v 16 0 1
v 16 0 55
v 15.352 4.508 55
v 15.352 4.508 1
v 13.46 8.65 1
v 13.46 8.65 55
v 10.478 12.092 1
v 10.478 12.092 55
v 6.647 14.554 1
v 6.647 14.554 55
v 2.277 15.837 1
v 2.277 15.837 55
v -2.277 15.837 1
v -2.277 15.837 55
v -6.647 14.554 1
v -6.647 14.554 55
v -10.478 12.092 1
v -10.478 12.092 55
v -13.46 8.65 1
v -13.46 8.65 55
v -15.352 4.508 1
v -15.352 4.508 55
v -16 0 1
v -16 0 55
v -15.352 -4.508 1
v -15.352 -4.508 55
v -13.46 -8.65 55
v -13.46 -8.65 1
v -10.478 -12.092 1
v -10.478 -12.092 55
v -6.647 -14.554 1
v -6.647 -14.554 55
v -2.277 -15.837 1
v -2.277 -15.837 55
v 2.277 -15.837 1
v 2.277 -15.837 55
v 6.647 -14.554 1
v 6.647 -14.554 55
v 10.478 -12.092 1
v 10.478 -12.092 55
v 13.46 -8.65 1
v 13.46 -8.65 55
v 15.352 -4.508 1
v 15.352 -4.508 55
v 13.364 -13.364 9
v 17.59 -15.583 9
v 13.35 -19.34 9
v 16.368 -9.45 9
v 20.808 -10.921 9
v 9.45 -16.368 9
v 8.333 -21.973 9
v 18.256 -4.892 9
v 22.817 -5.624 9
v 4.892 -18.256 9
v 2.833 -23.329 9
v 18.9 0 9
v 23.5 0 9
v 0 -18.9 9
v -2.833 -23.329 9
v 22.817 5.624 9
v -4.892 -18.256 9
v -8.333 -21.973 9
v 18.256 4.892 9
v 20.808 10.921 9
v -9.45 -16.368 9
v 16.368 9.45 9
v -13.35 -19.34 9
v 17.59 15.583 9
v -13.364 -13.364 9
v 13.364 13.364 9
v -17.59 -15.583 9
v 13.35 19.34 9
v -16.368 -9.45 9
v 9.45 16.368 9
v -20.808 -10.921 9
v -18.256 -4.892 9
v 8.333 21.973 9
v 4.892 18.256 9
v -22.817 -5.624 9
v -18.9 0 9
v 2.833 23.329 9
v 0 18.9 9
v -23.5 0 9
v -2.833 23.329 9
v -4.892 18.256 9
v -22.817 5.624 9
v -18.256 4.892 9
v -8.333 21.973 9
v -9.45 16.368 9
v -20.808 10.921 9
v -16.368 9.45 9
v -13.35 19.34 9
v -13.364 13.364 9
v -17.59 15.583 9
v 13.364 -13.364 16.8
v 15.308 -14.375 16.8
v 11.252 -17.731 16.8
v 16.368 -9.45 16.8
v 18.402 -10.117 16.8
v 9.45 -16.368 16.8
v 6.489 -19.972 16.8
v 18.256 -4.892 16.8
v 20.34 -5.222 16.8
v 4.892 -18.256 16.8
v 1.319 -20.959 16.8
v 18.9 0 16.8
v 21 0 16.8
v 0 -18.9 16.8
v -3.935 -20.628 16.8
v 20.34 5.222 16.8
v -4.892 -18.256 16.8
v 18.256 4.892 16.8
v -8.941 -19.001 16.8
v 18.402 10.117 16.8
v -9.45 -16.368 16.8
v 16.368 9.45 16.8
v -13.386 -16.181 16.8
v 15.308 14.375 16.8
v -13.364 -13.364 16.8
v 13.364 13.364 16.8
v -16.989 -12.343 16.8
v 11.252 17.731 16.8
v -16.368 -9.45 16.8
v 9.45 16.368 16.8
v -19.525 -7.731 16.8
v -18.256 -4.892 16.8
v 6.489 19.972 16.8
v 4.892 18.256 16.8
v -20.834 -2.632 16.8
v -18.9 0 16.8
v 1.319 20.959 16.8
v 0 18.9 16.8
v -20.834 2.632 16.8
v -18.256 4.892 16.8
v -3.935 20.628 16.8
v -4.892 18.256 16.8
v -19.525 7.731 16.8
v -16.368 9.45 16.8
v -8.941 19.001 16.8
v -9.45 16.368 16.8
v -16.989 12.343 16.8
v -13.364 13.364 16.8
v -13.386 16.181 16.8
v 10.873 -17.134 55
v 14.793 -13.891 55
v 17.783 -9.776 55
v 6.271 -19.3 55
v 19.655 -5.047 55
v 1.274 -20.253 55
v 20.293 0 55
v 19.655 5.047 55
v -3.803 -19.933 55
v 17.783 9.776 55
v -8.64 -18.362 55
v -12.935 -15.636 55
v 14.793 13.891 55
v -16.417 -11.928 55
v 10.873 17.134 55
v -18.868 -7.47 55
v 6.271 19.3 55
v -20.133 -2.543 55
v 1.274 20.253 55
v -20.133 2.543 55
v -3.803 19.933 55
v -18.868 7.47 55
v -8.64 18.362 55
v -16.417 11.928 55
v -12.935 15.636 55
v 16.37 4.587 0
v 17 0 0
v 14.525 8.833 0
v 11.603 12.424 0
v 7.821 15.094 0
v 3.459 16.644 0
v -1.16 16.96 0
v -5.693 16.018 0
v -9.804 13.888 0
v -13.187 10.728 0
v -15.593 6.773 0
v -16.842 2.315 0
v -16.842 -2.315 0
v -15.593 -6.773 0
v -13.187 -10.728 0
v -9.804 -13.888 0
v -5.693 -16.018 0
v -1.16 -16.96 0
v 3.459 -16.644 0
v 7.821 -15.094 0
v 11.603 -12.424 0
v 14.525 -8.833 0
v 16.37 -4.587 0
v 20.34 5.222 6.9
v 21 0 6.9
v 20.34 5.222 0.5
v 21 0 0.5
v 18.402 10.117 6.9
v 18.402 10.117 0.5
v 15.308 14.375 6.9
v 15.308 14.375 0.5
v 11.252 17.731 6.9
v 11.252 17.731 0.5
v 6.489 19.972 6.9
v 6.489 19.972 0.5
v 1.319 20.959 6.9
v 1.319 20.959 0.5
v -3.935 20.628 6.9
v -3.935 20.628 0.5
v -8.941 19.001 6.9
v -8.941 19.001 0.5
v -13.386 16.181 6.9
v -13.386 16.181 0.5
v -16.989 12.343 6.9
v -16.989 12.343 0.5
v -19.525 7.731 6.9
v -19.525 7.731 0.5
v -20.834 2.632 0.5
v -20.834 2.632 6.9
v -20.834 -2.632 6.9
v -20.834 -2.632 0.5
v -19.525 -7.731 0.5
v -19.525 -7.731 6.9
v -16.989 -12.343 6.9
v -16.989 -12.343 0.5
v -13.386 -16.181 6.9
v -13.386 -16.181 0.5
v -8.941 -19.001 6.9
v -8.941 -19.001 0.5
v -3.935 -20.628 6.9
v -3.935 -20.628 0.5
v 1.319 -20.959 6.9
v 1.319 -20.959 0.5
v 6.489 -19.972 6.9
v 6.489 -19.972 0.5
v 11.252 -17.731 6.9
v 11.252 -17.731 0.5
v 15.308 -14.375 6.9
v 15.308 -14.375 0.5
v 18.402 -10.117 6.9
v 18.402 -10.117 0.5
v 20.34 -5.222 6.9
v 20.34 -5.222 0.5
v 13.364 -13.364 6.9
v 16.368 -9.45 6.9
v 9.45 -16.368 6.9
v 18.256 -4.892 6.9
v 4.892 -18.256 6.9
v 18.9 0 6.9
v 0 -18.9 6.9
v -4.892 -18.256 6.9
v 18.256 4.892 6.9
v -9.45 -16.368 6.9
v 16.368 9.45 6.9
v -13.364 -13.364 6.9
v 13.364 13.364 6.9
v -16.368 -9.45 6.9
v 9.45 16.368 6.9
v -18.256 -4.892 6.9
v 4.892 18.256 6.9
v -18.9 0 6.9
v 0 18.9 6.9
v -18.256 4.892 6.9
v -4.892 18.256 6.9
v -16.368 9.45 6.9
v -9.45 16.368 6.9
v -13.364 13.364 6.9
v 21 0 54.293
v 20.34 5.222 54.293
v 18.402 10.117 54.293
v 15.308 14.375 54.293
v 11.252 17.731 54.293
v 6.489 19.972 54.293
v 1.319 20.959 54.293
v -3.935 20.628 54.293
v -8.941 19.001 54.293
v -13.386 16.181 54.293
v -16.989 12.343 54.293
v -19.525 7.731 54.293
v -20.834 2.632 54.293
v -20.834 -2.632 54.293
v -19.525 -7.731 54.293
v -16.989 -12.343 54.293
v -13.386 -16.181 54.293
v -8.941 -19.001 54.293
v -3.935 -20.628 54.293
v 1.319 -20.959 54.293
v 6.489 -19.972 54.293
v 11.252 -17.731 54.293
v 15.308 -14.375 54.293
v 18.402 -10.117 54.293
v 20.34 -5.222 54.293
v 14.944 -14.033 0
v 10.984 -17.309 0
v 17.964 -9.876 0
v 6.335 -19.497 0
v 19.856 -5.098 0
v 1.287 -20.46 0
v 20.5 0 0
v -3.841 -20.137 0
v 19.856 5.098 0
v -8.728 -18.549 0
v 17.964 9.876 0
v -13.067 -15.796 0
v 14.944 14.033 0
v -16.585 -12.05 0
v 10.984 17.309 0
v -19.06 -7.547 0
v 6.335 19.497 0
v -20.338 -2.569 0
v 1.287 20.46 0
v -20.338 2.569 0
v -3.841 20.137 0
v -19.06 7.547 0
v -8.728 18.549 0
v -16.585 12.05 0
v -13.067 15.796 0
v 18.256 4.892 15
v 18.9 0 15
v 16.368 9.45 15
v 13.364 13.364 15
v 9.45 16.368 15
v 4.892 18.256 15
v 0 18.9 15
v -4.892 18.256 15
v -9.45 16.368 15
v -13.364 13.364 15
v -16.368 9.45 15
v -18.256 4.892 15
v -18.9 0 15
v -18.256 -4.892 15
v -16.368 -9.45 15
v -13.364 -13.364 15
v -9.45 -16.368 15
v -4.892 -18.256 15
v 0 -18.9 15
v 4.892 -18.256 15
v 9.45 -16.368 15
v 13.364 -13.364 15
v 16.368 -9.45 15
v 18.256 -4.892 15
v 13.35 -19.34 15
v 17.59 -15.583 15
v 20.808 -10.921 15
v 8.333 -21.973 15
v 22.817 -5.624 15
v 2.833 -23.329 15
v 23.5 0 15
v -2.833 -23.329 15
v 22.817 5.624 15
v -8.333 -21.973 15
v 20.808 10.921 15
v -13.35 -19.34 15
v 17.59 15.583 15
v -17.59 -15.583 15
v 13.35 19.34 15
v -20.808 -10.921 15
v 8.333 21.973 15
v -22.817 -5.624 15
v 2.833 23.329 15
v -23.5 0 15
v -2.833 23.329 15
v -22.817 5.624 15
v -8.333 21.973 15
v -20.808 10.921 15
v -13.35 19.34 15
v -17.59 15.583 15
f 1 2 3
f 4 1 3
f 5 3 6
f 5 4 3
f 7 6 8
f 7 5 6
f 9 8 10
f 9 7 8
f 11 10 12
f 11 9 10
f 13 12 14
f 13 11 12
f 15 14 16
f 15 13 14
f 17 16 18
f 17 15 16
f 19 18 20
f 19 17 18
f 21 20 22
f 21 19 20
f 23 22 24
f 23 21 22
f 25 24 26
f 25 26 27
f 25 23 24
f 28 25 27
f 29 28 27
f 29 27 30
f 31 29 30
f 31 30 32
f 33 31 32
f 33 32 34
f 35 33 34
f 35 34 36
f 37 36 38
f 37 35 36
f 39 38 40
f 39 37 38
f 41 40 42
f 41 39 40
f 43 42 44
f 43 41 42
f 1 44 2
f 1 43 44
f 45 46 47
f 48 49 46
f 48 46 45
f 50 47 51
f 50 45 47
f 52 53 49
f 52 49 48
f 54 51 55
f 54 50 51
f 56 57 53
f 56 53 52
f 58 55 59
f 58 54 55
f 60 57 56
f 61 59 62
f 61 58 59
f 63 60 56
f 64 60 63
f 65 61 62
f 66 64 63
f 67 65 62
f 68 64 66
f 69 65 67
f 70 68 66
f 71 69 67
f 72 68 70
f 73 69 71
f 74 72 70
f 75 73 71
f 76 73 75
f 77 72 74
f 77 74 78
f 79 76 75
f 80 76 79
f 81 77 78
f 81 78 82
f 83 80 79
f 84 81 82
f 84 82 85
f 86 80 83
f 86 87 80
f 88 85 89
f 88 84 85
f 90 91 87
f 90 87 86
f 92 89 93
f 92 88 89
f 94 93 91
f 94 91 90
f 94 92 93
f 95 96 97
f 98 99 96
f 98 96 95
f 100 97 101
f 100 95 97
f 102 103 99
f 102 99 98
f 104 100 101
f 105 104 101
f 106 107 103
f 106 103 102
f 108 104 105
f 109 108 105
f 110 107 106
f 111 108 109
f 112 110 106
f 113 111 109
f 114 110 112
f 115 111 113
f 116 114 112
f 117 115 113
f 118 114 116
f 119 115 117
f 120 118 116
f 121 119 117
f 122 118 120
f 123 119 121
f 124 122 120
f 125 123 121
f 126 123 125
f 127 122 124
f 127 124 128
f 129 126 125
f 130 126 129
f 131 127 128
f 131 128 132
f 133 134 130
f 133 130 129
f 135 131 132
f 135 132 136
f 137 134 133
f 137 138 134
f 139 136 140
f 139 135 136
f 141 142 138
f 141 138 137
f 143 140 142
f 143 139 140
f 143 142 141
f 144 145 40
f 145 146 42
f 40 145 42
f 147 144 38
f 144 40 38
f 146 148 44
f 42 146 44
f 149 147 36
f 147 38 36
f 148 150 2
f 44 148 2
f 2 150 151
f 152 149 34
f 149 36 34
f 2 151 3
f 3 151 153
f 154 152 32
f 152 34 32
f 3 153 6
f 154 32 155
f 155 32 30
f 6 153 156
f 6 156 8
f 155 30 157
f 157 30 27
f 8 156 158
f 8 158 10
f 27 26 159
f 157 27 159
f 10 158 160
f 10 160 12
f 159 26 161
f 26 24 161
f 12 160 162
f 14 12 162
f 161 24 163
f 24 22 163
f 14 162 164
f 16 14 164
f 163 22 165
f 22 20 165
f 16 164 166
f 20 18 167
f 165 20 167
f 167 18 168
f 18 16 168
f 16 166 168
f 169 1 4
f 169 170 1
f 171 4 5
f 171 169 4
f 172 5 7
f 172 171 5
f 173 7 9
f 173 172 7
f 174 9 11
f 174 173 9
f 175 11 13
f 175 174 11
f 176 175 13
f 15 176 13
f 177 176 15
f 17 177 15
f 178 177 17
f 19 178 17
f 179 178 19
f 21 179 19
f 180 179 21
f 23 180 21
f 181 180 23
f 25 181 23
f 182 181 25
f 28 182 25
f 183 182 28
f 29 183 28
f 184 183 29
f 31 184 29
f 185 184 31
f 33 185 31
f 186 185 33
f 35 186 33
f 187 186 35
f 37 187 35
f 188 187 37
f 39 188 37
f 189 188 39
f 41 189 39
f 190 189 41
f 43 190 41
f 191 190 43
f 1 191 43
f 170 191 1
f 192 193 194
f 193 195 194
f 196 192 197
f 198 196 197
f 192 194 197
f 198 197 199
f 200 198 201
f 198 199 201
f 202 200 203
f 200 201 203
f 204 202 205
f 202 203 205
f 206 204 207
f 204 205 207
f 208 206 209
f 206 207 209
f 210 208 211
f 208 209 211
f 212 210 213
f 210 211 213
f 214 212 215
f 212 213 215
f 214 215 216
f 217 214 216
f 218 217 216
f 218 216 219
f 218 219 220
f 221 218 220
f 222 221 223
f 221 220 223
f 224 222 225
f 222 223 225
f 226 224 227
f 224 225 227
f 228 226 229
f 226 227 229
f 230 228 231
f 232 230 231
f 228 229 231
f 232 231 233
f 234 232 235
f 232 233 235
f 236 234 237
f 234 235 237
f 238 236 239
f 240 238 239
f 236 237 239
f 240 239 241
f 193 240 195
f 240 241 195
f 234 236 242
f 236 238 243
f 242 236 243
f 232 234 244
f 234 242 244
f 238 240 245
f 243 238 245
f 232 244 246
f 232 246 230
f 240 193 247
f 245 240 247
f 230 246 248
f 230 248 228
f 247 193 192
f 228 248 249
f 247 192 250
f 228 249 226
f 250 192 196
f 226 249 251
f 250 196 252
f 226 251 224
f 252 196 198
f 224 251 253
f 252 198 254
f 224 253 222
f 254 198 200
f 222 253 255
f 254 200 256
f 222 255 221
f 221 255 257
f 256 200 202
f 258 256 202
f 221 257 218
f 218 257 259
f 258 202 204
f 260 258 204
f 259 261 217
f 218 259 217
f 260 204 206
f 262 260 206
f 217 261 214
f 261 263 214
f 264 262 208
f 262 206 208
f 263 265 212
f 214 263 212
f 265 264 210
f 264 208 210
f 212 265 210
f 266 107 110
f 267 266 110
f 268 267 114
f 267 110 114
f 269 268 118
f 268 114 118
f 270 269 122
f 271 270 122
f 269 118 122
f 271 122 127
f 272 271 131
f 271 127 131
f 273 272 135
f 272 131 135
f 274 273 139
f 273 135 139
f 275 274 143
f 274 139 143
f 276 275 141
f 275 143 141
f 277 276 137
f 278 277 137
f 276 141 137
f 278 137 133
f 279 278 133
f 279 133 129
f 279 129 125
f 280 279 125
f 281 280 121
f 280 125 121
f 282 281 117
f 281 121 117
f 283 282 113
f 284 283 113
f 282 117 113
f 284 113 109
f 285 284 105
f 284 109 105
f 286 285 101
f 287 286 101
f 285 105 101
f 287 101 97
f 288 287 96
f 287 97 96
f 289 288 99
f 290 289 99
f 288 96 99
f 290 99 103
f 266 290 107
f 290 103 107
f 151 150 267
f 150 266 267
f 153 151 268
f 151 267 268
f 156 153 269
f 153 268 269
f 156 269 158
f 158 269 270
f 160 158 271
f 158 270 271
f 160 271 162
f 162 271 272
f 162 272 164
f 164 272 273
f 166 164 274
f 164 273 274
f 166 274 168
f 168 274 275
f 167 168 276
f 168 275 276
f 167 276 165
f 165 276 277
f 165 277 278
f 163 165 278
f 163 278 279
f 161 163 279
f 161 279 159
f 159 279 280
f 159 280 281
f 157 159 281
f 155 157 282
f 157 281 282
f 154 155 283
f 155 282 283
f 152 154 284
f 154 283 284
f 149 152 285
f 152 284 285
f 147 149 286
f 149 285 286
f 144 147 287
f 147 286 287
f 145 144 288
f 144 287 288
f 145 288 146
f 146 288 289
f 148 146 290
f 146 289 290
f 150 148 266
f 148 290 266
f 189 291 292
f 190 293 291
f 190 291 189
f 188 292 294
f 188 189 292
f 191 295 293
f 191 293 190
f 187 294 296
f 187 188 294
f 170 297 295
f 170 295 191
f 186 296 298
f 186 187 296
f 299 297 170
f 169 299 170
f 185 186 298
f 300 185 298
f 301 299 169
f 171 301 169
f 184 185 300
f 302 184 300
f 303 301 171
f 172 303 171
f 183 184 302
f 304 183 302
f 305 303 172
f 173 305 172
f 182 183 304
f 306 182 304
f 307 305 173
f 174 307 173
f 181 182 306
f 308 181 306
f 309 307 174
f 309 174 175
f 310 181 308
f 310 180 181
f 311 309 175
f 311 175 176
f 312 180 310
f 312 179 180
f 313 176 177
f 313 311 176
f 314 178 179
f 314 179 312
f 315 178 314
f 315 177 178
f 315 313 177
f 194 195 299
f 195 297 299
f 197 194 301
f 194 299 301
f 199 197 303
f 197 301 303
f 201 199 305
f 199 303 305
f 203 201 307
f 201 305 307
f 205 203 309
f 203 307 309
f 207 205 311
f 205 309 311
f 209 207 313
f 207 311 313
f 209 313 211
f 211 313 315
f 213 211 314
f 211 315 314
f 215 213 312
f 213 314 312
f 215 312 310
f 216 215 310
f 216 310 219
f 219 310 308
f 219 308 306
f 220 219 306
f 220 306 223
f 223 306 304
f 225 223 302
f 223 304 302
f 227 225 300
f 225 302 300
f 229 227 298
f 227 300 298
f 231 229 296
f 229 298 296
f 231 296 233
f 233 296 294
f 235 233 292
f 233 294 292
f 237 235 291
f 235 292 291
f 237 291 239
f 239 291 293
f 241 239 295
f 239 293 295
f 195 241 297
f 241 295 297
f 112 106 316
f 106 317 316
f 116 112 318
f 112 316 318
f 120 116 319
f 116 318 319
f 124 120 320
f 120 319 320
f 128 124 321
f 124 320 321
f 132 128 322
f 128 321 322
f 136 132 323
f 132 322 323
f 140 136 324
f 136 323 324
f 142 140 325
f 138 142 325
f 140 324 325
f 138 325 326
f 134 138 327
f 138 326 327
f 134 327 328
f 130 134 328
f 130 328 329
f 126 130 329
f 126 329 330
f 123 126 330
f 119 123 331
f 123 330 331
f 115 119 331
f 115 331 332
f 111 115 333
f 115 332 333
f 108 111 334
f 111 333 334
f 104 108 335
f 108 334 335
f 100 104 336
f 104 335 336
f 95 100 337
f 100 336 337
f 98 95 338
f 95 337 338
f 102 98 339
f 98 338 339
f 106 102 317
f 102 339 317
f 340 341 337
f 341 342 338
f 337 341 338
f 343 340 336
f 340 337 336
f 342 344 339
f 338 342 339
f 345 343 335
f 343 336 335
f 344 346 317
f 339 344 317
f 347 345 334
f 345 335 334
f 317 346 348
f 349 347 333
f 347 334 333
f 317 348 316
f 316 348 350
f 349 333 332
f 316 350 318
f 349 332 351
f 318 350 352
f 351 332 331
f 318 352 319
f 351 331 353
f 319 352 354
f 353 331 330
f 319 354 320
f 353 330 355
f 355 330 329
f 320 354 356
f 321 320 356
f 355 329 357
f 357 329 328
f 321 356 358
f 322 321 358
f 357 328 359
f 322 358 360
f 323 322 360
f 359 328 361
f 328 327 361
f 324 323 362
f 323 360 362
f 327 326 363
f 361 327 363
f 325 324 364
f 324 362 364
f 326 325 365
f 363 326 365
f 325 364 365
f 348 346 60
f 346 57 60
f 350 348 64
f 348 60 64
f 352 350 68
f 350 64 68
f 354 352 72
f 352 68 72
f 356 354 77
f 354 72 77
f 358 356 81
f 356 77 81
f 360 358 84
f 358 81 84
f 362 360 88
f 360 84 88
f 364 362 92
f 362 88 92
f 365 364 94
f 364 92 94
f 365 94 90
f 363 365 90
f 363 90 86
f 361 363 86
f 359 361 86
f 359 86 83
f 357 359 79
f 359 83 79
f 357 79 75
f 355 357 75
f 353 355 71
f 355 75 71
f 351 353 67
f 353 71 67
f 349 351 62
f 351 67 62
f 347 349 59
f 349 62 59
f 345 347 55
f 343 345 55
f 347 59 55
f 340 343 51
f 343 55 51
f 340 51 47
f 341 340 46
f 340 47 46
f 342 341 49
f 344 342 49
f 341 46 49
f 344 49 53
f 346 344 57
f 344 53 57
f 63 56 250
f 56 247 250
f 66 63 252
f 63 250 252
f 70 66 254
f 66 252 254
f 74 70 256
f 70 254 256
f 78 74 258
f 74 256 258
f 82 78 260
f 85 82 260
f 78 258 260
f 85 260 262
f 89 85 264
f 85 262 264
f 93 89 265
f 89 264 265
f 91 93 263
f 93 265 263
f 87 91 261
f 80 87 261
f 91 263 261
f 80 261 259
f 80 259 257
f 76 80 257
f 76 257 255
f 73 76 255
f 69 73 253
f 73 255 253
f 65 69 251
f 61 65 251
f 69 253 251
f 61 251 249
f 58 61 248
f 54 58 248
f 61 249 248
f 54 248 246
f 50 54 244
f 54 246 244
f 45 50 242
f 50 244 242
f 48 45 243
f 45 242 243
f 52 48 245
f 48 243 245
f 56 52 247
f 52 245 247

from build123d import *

# Parameters (mm, degrees)
SZKIC1_W = 6
SZKIC1_H = 23.5
SZKIC2_W = 40
SZKIC2_H = 21
SZKIC4_W = 1.8
SZKIC4_H = 2.1
SZKIC5_W = 9
SZKIC5_H = 21
SZKIC8_W = 2.1
SZKIC8_H = 2.1


with BuildPart() as part:
    # Szkic1 → Obrót1 (revolve)
    with BuildSketch(Plane(origin=(0, 0, 0), x_dir=(0, 0, -1), z_dir=(1, 0, 0))):
        with Locations((-12, 11.75)):
            Rectangle(SZKIC1_W, SZKIC1_H)
    revolve(axis=Axis((0, 0, 9), (0, 0, 1)))

    # Szkic2 → Obrót2 (revolve)
    with BuildSketch(Plane(origin=(0, 0, 0), x_dir=(0, 0, -1), z_dir=(1, 0, 0))):
        with Locations((-35, 10.5)):
            Rectangle(SZKIC2_W, SZKIC2_H)
    revolve(axis=Axis((0, 0, 15), (0, 0, 1)))

    # Szkic3 → Wycięcie-obrót1 (revolve, cut)
    with BuildSketch(Plane(origin=(0, 0, 0), x_dir=(0, 0, -1), z_dir=(1, 0, 0))):
        Polygon((-55, 20.292893219), (-54.292893219, 21), (-55, 21), align=None)
    revolve(axis=Axis((0, 0, 15), (0, 0, 1)), mode=Mode.SUBTRACT)

    # Szkic4 → Wycięcie-obrót2 (revolve, cut)
    with BuildSketch(Plane(origin=(0, 0, 0), x_dir=(0, 0, -1), z_dir=(1, 0, 0))):
        with Locations((-15.9, 19.95)):
            Rectangle(SZKIC4_W, SZKIC4_H)
    revolve(axis=Axis((0, 0, 15), (0, 0, 1)), mode=Mode.SUBTRACT)

    # Szkic5 → Obrót3 (revolve)
    with BuildSketch(Plane(origin=(0, 0, 0), x_dir=(0, 0, -1), z_dir=(1, 0, 0))):
        with Locations((-4.5, 10.5)):
            Rectangle(SZKIC5_W, SZKIC5_H)
    revolve(axis=Axis((0, 0, 0), (0, 0, 1)))

    # Szkic6 → Wycięcie-obrót3 (revolve, cut)
    with BuildSketch(Plane(origin=(0, 0, 0), x_dir=(0, 0, -1), z_dir=(1, 0, 0))):
        Polygon((-55, 0), (-55, 16), (-1, 16), (0, 17), (0, 0), align=None)
    revolve(axis=Axis((0, 0, 0), (0, 0, 1)), mode=Mode.SUBTRACT)

    # Szkic7 → Wycięcie-obrót4 (revolve, cut)
    with BuildSketch(Plane(origin=(0, 0, 0), x_dir=(0, 0, -1), z_dir=(1, 0, 0))):
        Polygon((-0.5, 21), (0, 20.5), (0, 21), align=None)
    revolve(axis=Axis((0, 0, 0), (0, 0, 1)), mode=Mode.SUBTRACT)

    # Szkic8 → Wycięcie-obrót5 (revolve, cut)
    with BuildSketch(Plane(origin=(0, 0, 0), x_dir=(0, 0, -1), z_dir=(1, 0, 0))):
        with Locations((-7.95, 19.95)):
            Rectangle(SZKIC8_W, SZKIC8_H)
    revolve(axis=Axis((0, 0, 0), (0, 0, 1)), mode=Mode.SUBTRACT)


solid = part.part
